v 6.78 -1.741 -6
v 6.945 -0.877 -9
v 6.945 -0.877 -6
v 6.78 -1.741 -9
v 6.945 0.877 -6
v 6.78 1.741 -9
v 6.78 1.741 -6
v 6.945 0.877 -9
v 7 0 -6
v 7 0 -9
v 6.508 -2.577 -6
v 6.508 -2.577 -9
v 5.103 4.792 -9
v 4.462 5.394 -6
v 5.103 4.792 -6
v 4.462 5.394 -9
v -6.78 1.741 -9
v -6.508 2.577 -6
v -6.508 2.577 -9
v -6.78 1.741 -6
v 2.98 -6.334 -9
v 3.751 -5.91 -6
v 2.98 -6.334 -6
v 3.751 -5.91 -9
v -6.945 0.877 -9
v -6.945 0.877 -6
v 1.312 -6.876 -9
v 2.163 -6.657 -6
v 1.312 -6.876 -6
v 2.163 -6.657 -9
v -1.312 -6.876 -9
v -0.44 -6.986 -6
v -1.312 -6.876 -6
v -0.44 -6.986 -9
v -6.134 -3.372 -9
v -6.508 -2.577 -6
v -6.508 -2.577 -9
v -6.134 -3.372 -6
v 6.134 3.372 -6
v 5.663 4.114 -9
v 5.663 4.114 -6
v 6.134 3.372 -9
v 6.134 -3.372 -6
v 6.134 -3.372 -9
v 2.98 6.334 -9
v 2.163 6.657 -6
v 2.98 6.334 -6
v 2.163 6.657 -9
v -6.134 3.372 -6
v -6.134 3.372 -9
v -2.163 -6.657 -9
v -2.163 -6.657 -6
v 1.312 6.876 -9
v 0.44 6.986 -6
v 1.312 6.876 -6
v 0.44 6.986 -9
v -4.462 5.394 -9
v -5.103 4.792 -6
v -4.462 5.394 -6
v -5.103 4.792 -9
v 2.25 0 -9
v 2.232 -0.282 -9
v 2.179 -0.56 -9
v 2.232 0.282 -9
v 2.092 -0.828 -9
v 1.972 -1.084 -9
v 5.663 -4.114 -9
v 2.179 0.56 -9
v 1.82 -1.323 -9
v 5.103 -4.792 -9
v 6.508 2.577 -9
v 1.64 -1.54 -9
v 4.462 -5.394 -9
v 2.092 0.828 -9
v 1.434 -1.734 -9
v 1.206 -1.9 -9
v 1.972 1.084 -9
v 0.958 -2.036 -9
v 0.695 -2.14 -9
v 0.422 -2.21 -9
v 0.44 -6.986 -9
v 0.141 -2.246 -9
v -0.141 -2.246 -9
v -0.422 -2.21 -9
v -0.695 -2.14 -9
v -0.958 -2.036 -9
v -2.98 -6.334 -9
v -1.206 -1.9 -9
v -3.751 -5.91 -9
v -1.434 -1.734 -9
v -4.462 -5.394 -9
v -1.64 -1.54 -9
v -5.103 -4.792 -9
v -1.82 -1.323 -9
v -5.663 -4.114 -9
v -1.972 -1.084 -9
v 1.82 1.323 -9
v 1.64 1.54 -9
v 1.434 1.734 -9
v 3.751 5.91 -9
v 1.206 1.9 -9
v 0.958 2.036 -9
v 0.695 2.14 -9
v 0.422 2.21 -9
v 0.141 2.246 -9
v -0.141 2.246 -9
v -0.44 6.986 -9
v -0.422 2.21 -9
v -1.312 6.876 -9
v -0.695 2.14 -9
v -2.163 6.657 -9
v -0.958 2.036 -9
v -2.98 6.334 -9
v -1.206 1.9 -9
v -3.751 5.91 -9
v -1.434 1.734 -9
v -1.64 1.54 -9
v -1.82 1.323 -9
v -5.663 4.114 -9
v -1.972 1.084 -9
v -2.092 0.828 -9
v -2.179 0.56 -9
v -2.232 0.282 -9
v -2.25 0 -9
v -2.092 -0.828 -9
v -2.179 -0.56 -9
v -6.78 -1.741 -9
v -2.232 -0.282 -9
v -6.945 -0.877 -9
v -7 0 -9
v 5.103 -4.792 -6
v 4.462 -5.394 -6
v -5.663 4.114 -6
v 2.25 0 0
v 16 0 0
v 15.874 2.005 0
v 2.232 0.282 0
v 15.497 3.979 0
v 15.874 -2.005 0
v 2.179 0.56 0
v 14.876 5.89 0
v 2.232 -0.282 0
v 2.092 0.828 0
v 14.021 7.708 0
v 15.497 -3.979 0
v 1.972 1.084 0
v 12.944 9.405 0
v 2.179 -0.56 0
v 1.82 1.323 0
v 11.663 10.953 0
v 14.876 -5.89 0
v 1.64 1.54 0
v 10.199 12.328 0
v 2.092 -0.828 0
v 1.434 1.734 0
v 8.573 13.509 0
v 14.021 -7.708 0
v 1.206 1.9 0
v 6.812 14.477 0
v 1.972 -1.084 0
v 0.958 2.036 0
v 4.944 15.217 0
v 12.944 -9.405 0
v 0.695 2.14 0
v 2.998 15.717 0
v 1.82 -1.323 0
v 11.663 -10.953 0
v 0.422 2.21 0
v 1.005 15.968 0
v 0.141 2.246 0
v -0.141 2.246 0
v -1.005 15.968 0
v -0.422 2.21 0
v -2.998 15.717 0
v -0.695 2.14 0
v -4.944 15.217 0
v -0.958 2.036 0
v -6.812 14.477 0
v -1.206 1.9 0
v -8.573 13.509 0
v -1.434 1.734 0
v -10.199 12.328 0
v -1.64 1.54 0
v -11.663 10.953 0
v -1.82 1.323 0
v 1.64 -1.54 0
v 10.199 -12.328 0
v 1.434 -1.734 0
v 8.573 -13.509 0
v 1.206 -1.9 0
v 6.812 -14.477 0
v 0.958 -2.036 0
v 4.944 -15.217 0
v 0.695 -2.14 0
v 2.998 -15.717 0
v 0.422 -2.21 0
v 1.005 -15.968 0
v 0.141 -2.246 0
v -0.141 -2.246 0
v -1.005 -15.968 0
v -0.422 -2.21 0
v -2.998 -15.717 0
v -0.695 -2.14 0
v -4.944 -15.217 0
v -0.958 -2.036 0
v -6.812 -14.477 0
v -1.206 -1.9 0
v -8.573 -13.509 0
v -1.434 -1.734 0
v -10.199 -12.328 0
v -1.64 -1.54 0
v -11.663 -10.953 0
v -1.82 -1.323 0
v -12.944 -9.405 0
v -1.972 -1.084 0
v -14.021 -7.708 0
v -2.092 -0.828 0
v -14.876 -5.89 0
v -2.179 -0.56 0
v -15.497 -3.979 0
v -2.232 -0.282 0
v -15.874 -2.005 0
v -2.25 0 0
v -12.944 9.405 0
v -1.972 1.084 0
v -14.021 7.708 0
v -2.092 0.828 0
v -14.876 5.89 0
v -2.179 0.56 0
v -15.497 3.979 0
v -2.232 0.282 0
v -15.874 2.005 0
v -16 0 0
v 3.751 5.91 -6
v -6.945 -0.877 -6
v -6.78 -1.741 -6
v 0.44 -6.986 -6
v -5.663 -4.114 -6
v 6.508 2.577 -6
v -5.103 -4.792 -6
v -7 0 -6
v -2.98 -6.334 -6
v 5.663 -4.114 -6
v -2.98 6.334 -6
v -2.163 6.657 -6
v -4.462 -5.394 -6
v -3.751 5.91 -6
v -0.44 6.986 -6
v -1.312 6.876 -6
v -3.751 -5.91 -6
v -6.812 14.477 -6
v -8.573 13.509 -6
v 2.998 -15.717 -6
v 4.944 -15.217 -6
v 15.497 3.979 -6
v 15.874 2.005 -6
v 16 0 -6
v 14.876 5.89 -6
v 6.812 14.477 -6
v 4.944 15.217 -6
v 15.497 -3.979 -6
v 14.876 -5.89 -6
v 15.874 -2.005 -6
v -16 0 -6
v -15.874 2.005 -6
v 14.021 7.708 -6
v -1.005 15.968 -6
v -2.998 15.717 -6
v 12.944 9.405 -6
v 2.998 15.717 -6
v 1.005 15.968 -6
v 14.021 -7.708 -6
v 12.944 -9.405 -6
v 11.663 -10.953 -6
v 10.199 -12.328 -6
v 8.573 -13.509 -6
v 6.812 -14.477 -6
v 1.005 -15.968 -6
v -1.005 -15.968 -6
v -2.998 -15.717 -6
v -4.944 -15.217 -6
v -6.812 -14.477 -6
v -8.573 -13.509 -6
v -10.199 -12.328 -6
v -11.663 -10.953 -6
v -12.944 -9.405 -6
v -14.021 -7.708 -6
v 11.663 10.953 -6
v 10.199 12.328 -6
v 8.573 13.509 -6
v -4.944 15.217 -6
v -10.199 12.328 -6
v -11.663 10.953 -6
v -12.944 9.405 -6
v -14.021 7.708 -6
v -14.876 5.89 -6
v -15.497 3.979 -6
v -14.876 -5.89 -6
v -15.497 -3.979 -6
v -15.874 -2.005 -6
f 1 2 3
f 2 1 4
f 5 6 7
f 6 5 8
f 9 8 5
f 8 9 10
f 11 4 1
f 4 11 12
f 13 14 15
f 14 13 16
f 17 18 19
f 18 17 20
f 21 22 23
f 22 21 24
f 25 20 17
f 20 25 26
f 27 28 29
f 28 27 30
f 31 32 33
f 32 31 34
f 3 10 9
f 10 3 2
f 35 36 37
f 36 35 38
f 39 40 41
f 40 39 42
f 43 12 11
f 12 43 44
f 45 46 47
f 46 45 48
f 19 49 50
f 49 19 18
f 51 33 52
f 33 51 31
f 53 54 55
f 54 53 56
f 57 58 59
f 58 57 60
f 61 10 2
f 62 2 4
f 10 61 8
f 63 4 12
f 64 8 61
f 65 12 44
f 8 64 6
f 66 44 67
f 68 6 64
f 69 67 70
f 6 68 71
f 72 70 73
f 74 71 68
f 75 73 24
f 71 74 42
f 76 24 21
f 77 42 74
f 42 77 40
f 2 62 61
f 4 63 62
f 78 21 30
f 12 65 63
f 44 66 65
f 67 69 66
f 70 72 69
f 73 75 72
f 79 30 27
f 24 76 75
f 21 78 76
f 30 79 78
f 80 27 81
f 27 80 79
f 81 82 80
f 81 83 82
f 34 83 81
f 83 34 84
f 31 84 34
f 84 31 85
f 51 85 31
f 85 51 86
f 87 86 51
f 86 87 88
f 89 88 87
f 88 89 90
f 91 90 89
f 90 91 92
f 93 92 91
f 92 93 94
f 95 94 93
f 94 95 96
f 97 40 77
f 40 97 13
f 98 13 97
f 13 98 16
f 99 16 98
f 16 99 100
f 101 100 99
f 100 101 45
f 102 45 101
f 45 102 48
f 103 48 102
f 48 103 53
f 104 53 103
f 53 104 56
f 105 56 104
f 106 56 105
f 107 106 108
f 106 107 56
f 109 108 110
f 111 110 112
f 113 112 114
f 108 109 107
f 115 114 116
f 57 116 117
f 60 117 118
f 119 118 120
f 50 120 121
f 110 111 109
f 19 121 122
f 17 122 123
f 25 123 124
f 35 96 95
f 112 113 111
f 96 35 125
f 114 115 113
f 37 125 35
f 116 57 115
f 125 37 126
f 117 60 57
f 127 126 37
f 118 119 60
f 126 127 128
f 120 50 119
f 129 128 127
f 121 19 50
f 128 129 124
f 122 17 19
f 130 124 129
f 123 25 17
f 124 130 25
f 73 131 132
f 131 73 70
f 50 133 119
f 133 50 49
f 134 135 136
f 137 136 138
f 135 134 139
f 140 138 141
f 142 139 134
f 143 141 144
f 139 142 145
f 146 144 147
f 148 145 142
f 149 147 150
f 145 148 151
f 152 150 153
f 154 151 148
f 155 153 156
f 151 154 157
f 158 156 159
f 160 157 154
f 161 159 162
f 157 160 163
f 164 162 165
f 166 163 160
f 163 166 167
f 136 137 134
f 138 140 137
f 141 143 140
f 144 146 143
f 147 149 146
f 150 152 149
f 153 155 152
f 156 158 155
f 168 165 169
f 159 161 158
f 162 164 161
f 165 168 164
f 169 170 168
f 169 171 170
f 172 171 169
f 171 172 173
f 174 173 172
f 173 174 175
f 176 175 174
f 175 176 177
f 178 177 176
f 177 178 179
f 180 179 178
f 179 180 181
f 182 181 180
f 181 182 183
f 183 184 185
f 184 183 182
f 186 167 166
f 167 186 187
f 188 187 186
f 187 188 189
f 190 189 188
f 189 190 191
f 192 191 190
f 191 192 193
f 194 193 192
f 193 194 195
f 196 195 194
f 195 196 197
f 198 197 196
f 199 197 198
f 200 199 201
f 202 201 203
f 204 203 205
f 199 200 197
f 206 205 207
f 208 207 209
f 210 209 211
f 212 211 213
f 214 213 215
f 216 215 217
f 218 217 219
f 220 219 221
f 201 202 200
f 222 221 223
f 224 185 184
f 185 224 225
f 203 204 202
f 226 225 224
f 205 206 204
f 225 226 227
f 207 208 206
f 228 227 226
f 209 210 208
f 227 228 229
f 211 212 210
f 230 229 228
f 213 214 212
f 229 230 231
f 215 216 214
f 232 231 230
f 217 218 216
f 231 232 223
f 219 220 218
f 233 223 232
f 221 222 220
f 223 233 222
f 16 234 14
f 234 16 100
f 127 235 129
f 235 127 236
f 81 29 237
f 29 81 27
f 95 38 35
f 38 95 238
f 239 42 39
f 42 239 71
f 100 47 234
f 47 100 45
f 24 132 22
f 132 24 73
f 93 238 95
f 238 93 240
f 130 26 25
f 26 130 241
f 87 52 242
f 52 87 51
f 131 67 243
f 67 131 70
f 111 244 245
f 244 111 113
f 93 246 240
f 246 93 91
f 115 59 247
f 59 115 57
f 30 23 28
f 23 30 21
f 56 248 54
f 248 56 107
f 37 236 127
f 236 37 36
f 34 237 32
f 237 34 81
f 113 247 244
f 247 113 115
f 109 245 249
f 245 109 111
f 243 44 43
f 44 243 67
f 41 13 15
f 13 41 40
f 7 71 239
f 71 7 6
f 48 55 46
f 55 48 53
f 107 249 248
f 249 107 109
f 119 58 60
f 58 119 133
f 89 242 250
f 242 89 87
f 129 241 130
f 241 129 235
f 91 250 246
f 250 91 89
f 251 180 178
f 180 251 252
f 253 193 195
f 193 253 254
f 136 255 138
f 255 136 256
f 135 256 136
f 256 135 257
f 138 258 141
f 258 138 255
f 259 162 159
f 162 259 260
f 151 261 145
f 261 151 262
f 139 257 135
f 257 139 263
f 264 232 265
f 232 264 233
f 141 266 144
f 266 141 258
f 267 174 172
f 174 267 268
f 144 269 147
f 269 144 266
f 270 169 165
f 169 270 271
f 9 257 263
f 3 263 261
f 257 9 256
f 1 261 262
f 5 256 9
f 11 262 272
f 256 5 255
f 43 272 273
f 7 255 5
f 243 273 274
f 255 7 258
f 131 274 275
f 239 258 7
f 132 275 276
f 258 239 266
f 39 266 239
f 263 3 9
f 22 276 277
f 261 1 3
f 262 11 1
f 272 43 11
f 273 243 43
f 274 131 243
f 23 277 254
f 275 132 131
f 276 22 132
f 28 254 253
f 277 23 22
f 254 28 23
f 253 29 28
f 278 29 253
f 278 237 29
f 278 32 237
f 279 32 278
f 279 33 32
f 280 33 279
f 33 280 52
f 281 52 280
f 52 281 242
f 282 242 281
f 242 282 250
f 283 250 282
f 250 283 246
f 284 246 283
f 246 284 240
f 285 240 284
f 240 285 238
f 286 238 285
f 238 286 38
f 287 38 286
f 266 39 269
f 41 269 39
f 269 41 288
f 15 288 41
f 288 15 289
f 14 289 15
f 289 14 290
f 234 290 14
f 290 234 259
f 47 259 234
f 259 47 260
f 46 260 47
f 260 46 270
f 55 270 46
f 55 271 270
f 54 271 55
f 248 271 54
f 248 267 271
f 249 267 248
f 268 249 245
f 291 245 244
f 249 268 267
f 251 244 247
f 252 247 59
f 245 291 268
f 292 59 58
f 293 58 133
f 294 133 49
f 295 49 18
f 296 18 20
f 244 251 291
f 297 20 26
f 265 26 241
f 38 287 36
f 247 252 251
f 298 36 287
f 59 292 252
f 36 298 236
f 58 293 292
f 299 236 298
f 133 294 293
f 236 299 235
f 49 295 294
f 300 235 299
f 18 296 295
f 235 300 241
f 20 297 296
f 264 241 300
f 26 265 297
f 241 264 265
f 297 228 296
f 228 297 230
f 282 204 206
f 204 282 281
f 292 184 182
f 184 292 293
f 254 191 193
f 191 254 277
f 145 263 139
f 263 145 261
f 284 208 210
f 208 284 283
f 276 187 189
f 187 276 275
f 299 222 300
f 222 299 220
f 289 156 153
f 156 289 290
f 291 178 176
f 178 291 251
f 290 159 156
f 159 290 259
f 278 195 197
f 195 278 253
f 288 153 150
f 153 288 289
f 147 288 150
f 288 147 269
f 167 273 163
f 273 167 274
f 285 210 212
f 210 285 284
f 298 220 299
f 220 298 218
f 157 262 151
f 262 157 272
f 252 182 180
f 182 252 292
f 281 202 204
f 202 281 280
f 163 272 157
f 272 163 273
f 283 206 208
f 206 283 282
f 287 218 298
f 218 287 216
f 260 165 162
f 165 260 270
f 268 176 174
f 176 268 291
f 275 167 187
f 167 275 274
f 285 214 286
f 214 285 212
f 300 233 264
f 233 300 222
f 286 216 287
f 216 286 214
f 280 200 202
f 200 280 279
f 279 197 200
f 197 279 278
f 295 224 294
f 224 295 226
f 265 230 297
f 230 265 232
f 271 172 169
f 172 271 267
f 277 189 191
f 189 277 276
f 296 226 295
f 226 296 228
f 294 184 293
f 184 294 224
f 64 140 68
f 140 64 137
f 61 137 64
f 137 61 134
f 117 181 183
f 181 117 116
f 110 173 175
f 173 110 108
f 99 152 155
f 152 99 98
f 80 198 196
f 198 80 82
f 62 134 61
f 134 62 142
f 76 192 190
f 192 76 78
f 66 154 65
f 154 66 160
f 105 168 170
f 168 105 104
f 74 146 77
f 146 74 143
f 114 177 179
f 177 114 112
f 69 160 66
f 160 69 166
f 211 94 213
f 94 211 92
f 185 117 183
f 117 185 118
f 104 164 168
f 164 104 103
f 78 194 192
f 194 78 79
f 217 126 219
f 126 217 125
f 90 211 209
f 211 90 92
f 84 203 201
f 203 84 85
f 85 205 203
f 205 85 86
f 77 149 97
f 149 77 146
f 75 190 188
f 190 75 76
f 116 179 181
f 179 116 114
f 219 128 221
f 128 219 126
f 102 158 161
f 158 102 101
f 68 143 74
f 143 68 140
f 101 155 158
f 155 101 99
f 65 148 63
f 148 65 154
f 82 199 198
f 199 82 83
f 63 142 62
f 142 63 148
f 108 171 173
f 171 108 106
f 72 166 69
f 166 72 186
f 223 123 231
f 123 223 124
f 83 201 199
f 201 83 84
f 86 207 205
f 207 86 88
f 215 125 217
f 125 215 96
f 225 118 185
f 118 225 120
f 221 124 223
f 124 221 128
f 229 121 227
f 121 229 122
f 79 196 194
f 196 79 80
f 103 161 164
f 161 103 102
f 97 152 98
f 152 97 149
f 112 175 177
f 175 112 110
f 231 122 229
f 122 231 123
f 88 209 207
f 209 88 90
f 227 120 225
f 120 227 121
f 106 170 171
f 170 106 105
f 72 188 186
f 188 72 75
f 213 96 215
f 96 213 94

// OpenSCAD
$fn = 50;


difference() {
	union() {
		translate(v = [0, 0, -9.0000000000]) {
			cylinder(h = 9, r = 7.0000000000);
		}
		translate(v = [0, 0, -6.0000000000]) {
			cylinder(h = 6, r = 16.0000000000);
		}
	}
	union() {
		#translate(v = [0, 0, -9]) {
			cylinder(h = 9, r = 2.2500000000);
		}
	}
}
